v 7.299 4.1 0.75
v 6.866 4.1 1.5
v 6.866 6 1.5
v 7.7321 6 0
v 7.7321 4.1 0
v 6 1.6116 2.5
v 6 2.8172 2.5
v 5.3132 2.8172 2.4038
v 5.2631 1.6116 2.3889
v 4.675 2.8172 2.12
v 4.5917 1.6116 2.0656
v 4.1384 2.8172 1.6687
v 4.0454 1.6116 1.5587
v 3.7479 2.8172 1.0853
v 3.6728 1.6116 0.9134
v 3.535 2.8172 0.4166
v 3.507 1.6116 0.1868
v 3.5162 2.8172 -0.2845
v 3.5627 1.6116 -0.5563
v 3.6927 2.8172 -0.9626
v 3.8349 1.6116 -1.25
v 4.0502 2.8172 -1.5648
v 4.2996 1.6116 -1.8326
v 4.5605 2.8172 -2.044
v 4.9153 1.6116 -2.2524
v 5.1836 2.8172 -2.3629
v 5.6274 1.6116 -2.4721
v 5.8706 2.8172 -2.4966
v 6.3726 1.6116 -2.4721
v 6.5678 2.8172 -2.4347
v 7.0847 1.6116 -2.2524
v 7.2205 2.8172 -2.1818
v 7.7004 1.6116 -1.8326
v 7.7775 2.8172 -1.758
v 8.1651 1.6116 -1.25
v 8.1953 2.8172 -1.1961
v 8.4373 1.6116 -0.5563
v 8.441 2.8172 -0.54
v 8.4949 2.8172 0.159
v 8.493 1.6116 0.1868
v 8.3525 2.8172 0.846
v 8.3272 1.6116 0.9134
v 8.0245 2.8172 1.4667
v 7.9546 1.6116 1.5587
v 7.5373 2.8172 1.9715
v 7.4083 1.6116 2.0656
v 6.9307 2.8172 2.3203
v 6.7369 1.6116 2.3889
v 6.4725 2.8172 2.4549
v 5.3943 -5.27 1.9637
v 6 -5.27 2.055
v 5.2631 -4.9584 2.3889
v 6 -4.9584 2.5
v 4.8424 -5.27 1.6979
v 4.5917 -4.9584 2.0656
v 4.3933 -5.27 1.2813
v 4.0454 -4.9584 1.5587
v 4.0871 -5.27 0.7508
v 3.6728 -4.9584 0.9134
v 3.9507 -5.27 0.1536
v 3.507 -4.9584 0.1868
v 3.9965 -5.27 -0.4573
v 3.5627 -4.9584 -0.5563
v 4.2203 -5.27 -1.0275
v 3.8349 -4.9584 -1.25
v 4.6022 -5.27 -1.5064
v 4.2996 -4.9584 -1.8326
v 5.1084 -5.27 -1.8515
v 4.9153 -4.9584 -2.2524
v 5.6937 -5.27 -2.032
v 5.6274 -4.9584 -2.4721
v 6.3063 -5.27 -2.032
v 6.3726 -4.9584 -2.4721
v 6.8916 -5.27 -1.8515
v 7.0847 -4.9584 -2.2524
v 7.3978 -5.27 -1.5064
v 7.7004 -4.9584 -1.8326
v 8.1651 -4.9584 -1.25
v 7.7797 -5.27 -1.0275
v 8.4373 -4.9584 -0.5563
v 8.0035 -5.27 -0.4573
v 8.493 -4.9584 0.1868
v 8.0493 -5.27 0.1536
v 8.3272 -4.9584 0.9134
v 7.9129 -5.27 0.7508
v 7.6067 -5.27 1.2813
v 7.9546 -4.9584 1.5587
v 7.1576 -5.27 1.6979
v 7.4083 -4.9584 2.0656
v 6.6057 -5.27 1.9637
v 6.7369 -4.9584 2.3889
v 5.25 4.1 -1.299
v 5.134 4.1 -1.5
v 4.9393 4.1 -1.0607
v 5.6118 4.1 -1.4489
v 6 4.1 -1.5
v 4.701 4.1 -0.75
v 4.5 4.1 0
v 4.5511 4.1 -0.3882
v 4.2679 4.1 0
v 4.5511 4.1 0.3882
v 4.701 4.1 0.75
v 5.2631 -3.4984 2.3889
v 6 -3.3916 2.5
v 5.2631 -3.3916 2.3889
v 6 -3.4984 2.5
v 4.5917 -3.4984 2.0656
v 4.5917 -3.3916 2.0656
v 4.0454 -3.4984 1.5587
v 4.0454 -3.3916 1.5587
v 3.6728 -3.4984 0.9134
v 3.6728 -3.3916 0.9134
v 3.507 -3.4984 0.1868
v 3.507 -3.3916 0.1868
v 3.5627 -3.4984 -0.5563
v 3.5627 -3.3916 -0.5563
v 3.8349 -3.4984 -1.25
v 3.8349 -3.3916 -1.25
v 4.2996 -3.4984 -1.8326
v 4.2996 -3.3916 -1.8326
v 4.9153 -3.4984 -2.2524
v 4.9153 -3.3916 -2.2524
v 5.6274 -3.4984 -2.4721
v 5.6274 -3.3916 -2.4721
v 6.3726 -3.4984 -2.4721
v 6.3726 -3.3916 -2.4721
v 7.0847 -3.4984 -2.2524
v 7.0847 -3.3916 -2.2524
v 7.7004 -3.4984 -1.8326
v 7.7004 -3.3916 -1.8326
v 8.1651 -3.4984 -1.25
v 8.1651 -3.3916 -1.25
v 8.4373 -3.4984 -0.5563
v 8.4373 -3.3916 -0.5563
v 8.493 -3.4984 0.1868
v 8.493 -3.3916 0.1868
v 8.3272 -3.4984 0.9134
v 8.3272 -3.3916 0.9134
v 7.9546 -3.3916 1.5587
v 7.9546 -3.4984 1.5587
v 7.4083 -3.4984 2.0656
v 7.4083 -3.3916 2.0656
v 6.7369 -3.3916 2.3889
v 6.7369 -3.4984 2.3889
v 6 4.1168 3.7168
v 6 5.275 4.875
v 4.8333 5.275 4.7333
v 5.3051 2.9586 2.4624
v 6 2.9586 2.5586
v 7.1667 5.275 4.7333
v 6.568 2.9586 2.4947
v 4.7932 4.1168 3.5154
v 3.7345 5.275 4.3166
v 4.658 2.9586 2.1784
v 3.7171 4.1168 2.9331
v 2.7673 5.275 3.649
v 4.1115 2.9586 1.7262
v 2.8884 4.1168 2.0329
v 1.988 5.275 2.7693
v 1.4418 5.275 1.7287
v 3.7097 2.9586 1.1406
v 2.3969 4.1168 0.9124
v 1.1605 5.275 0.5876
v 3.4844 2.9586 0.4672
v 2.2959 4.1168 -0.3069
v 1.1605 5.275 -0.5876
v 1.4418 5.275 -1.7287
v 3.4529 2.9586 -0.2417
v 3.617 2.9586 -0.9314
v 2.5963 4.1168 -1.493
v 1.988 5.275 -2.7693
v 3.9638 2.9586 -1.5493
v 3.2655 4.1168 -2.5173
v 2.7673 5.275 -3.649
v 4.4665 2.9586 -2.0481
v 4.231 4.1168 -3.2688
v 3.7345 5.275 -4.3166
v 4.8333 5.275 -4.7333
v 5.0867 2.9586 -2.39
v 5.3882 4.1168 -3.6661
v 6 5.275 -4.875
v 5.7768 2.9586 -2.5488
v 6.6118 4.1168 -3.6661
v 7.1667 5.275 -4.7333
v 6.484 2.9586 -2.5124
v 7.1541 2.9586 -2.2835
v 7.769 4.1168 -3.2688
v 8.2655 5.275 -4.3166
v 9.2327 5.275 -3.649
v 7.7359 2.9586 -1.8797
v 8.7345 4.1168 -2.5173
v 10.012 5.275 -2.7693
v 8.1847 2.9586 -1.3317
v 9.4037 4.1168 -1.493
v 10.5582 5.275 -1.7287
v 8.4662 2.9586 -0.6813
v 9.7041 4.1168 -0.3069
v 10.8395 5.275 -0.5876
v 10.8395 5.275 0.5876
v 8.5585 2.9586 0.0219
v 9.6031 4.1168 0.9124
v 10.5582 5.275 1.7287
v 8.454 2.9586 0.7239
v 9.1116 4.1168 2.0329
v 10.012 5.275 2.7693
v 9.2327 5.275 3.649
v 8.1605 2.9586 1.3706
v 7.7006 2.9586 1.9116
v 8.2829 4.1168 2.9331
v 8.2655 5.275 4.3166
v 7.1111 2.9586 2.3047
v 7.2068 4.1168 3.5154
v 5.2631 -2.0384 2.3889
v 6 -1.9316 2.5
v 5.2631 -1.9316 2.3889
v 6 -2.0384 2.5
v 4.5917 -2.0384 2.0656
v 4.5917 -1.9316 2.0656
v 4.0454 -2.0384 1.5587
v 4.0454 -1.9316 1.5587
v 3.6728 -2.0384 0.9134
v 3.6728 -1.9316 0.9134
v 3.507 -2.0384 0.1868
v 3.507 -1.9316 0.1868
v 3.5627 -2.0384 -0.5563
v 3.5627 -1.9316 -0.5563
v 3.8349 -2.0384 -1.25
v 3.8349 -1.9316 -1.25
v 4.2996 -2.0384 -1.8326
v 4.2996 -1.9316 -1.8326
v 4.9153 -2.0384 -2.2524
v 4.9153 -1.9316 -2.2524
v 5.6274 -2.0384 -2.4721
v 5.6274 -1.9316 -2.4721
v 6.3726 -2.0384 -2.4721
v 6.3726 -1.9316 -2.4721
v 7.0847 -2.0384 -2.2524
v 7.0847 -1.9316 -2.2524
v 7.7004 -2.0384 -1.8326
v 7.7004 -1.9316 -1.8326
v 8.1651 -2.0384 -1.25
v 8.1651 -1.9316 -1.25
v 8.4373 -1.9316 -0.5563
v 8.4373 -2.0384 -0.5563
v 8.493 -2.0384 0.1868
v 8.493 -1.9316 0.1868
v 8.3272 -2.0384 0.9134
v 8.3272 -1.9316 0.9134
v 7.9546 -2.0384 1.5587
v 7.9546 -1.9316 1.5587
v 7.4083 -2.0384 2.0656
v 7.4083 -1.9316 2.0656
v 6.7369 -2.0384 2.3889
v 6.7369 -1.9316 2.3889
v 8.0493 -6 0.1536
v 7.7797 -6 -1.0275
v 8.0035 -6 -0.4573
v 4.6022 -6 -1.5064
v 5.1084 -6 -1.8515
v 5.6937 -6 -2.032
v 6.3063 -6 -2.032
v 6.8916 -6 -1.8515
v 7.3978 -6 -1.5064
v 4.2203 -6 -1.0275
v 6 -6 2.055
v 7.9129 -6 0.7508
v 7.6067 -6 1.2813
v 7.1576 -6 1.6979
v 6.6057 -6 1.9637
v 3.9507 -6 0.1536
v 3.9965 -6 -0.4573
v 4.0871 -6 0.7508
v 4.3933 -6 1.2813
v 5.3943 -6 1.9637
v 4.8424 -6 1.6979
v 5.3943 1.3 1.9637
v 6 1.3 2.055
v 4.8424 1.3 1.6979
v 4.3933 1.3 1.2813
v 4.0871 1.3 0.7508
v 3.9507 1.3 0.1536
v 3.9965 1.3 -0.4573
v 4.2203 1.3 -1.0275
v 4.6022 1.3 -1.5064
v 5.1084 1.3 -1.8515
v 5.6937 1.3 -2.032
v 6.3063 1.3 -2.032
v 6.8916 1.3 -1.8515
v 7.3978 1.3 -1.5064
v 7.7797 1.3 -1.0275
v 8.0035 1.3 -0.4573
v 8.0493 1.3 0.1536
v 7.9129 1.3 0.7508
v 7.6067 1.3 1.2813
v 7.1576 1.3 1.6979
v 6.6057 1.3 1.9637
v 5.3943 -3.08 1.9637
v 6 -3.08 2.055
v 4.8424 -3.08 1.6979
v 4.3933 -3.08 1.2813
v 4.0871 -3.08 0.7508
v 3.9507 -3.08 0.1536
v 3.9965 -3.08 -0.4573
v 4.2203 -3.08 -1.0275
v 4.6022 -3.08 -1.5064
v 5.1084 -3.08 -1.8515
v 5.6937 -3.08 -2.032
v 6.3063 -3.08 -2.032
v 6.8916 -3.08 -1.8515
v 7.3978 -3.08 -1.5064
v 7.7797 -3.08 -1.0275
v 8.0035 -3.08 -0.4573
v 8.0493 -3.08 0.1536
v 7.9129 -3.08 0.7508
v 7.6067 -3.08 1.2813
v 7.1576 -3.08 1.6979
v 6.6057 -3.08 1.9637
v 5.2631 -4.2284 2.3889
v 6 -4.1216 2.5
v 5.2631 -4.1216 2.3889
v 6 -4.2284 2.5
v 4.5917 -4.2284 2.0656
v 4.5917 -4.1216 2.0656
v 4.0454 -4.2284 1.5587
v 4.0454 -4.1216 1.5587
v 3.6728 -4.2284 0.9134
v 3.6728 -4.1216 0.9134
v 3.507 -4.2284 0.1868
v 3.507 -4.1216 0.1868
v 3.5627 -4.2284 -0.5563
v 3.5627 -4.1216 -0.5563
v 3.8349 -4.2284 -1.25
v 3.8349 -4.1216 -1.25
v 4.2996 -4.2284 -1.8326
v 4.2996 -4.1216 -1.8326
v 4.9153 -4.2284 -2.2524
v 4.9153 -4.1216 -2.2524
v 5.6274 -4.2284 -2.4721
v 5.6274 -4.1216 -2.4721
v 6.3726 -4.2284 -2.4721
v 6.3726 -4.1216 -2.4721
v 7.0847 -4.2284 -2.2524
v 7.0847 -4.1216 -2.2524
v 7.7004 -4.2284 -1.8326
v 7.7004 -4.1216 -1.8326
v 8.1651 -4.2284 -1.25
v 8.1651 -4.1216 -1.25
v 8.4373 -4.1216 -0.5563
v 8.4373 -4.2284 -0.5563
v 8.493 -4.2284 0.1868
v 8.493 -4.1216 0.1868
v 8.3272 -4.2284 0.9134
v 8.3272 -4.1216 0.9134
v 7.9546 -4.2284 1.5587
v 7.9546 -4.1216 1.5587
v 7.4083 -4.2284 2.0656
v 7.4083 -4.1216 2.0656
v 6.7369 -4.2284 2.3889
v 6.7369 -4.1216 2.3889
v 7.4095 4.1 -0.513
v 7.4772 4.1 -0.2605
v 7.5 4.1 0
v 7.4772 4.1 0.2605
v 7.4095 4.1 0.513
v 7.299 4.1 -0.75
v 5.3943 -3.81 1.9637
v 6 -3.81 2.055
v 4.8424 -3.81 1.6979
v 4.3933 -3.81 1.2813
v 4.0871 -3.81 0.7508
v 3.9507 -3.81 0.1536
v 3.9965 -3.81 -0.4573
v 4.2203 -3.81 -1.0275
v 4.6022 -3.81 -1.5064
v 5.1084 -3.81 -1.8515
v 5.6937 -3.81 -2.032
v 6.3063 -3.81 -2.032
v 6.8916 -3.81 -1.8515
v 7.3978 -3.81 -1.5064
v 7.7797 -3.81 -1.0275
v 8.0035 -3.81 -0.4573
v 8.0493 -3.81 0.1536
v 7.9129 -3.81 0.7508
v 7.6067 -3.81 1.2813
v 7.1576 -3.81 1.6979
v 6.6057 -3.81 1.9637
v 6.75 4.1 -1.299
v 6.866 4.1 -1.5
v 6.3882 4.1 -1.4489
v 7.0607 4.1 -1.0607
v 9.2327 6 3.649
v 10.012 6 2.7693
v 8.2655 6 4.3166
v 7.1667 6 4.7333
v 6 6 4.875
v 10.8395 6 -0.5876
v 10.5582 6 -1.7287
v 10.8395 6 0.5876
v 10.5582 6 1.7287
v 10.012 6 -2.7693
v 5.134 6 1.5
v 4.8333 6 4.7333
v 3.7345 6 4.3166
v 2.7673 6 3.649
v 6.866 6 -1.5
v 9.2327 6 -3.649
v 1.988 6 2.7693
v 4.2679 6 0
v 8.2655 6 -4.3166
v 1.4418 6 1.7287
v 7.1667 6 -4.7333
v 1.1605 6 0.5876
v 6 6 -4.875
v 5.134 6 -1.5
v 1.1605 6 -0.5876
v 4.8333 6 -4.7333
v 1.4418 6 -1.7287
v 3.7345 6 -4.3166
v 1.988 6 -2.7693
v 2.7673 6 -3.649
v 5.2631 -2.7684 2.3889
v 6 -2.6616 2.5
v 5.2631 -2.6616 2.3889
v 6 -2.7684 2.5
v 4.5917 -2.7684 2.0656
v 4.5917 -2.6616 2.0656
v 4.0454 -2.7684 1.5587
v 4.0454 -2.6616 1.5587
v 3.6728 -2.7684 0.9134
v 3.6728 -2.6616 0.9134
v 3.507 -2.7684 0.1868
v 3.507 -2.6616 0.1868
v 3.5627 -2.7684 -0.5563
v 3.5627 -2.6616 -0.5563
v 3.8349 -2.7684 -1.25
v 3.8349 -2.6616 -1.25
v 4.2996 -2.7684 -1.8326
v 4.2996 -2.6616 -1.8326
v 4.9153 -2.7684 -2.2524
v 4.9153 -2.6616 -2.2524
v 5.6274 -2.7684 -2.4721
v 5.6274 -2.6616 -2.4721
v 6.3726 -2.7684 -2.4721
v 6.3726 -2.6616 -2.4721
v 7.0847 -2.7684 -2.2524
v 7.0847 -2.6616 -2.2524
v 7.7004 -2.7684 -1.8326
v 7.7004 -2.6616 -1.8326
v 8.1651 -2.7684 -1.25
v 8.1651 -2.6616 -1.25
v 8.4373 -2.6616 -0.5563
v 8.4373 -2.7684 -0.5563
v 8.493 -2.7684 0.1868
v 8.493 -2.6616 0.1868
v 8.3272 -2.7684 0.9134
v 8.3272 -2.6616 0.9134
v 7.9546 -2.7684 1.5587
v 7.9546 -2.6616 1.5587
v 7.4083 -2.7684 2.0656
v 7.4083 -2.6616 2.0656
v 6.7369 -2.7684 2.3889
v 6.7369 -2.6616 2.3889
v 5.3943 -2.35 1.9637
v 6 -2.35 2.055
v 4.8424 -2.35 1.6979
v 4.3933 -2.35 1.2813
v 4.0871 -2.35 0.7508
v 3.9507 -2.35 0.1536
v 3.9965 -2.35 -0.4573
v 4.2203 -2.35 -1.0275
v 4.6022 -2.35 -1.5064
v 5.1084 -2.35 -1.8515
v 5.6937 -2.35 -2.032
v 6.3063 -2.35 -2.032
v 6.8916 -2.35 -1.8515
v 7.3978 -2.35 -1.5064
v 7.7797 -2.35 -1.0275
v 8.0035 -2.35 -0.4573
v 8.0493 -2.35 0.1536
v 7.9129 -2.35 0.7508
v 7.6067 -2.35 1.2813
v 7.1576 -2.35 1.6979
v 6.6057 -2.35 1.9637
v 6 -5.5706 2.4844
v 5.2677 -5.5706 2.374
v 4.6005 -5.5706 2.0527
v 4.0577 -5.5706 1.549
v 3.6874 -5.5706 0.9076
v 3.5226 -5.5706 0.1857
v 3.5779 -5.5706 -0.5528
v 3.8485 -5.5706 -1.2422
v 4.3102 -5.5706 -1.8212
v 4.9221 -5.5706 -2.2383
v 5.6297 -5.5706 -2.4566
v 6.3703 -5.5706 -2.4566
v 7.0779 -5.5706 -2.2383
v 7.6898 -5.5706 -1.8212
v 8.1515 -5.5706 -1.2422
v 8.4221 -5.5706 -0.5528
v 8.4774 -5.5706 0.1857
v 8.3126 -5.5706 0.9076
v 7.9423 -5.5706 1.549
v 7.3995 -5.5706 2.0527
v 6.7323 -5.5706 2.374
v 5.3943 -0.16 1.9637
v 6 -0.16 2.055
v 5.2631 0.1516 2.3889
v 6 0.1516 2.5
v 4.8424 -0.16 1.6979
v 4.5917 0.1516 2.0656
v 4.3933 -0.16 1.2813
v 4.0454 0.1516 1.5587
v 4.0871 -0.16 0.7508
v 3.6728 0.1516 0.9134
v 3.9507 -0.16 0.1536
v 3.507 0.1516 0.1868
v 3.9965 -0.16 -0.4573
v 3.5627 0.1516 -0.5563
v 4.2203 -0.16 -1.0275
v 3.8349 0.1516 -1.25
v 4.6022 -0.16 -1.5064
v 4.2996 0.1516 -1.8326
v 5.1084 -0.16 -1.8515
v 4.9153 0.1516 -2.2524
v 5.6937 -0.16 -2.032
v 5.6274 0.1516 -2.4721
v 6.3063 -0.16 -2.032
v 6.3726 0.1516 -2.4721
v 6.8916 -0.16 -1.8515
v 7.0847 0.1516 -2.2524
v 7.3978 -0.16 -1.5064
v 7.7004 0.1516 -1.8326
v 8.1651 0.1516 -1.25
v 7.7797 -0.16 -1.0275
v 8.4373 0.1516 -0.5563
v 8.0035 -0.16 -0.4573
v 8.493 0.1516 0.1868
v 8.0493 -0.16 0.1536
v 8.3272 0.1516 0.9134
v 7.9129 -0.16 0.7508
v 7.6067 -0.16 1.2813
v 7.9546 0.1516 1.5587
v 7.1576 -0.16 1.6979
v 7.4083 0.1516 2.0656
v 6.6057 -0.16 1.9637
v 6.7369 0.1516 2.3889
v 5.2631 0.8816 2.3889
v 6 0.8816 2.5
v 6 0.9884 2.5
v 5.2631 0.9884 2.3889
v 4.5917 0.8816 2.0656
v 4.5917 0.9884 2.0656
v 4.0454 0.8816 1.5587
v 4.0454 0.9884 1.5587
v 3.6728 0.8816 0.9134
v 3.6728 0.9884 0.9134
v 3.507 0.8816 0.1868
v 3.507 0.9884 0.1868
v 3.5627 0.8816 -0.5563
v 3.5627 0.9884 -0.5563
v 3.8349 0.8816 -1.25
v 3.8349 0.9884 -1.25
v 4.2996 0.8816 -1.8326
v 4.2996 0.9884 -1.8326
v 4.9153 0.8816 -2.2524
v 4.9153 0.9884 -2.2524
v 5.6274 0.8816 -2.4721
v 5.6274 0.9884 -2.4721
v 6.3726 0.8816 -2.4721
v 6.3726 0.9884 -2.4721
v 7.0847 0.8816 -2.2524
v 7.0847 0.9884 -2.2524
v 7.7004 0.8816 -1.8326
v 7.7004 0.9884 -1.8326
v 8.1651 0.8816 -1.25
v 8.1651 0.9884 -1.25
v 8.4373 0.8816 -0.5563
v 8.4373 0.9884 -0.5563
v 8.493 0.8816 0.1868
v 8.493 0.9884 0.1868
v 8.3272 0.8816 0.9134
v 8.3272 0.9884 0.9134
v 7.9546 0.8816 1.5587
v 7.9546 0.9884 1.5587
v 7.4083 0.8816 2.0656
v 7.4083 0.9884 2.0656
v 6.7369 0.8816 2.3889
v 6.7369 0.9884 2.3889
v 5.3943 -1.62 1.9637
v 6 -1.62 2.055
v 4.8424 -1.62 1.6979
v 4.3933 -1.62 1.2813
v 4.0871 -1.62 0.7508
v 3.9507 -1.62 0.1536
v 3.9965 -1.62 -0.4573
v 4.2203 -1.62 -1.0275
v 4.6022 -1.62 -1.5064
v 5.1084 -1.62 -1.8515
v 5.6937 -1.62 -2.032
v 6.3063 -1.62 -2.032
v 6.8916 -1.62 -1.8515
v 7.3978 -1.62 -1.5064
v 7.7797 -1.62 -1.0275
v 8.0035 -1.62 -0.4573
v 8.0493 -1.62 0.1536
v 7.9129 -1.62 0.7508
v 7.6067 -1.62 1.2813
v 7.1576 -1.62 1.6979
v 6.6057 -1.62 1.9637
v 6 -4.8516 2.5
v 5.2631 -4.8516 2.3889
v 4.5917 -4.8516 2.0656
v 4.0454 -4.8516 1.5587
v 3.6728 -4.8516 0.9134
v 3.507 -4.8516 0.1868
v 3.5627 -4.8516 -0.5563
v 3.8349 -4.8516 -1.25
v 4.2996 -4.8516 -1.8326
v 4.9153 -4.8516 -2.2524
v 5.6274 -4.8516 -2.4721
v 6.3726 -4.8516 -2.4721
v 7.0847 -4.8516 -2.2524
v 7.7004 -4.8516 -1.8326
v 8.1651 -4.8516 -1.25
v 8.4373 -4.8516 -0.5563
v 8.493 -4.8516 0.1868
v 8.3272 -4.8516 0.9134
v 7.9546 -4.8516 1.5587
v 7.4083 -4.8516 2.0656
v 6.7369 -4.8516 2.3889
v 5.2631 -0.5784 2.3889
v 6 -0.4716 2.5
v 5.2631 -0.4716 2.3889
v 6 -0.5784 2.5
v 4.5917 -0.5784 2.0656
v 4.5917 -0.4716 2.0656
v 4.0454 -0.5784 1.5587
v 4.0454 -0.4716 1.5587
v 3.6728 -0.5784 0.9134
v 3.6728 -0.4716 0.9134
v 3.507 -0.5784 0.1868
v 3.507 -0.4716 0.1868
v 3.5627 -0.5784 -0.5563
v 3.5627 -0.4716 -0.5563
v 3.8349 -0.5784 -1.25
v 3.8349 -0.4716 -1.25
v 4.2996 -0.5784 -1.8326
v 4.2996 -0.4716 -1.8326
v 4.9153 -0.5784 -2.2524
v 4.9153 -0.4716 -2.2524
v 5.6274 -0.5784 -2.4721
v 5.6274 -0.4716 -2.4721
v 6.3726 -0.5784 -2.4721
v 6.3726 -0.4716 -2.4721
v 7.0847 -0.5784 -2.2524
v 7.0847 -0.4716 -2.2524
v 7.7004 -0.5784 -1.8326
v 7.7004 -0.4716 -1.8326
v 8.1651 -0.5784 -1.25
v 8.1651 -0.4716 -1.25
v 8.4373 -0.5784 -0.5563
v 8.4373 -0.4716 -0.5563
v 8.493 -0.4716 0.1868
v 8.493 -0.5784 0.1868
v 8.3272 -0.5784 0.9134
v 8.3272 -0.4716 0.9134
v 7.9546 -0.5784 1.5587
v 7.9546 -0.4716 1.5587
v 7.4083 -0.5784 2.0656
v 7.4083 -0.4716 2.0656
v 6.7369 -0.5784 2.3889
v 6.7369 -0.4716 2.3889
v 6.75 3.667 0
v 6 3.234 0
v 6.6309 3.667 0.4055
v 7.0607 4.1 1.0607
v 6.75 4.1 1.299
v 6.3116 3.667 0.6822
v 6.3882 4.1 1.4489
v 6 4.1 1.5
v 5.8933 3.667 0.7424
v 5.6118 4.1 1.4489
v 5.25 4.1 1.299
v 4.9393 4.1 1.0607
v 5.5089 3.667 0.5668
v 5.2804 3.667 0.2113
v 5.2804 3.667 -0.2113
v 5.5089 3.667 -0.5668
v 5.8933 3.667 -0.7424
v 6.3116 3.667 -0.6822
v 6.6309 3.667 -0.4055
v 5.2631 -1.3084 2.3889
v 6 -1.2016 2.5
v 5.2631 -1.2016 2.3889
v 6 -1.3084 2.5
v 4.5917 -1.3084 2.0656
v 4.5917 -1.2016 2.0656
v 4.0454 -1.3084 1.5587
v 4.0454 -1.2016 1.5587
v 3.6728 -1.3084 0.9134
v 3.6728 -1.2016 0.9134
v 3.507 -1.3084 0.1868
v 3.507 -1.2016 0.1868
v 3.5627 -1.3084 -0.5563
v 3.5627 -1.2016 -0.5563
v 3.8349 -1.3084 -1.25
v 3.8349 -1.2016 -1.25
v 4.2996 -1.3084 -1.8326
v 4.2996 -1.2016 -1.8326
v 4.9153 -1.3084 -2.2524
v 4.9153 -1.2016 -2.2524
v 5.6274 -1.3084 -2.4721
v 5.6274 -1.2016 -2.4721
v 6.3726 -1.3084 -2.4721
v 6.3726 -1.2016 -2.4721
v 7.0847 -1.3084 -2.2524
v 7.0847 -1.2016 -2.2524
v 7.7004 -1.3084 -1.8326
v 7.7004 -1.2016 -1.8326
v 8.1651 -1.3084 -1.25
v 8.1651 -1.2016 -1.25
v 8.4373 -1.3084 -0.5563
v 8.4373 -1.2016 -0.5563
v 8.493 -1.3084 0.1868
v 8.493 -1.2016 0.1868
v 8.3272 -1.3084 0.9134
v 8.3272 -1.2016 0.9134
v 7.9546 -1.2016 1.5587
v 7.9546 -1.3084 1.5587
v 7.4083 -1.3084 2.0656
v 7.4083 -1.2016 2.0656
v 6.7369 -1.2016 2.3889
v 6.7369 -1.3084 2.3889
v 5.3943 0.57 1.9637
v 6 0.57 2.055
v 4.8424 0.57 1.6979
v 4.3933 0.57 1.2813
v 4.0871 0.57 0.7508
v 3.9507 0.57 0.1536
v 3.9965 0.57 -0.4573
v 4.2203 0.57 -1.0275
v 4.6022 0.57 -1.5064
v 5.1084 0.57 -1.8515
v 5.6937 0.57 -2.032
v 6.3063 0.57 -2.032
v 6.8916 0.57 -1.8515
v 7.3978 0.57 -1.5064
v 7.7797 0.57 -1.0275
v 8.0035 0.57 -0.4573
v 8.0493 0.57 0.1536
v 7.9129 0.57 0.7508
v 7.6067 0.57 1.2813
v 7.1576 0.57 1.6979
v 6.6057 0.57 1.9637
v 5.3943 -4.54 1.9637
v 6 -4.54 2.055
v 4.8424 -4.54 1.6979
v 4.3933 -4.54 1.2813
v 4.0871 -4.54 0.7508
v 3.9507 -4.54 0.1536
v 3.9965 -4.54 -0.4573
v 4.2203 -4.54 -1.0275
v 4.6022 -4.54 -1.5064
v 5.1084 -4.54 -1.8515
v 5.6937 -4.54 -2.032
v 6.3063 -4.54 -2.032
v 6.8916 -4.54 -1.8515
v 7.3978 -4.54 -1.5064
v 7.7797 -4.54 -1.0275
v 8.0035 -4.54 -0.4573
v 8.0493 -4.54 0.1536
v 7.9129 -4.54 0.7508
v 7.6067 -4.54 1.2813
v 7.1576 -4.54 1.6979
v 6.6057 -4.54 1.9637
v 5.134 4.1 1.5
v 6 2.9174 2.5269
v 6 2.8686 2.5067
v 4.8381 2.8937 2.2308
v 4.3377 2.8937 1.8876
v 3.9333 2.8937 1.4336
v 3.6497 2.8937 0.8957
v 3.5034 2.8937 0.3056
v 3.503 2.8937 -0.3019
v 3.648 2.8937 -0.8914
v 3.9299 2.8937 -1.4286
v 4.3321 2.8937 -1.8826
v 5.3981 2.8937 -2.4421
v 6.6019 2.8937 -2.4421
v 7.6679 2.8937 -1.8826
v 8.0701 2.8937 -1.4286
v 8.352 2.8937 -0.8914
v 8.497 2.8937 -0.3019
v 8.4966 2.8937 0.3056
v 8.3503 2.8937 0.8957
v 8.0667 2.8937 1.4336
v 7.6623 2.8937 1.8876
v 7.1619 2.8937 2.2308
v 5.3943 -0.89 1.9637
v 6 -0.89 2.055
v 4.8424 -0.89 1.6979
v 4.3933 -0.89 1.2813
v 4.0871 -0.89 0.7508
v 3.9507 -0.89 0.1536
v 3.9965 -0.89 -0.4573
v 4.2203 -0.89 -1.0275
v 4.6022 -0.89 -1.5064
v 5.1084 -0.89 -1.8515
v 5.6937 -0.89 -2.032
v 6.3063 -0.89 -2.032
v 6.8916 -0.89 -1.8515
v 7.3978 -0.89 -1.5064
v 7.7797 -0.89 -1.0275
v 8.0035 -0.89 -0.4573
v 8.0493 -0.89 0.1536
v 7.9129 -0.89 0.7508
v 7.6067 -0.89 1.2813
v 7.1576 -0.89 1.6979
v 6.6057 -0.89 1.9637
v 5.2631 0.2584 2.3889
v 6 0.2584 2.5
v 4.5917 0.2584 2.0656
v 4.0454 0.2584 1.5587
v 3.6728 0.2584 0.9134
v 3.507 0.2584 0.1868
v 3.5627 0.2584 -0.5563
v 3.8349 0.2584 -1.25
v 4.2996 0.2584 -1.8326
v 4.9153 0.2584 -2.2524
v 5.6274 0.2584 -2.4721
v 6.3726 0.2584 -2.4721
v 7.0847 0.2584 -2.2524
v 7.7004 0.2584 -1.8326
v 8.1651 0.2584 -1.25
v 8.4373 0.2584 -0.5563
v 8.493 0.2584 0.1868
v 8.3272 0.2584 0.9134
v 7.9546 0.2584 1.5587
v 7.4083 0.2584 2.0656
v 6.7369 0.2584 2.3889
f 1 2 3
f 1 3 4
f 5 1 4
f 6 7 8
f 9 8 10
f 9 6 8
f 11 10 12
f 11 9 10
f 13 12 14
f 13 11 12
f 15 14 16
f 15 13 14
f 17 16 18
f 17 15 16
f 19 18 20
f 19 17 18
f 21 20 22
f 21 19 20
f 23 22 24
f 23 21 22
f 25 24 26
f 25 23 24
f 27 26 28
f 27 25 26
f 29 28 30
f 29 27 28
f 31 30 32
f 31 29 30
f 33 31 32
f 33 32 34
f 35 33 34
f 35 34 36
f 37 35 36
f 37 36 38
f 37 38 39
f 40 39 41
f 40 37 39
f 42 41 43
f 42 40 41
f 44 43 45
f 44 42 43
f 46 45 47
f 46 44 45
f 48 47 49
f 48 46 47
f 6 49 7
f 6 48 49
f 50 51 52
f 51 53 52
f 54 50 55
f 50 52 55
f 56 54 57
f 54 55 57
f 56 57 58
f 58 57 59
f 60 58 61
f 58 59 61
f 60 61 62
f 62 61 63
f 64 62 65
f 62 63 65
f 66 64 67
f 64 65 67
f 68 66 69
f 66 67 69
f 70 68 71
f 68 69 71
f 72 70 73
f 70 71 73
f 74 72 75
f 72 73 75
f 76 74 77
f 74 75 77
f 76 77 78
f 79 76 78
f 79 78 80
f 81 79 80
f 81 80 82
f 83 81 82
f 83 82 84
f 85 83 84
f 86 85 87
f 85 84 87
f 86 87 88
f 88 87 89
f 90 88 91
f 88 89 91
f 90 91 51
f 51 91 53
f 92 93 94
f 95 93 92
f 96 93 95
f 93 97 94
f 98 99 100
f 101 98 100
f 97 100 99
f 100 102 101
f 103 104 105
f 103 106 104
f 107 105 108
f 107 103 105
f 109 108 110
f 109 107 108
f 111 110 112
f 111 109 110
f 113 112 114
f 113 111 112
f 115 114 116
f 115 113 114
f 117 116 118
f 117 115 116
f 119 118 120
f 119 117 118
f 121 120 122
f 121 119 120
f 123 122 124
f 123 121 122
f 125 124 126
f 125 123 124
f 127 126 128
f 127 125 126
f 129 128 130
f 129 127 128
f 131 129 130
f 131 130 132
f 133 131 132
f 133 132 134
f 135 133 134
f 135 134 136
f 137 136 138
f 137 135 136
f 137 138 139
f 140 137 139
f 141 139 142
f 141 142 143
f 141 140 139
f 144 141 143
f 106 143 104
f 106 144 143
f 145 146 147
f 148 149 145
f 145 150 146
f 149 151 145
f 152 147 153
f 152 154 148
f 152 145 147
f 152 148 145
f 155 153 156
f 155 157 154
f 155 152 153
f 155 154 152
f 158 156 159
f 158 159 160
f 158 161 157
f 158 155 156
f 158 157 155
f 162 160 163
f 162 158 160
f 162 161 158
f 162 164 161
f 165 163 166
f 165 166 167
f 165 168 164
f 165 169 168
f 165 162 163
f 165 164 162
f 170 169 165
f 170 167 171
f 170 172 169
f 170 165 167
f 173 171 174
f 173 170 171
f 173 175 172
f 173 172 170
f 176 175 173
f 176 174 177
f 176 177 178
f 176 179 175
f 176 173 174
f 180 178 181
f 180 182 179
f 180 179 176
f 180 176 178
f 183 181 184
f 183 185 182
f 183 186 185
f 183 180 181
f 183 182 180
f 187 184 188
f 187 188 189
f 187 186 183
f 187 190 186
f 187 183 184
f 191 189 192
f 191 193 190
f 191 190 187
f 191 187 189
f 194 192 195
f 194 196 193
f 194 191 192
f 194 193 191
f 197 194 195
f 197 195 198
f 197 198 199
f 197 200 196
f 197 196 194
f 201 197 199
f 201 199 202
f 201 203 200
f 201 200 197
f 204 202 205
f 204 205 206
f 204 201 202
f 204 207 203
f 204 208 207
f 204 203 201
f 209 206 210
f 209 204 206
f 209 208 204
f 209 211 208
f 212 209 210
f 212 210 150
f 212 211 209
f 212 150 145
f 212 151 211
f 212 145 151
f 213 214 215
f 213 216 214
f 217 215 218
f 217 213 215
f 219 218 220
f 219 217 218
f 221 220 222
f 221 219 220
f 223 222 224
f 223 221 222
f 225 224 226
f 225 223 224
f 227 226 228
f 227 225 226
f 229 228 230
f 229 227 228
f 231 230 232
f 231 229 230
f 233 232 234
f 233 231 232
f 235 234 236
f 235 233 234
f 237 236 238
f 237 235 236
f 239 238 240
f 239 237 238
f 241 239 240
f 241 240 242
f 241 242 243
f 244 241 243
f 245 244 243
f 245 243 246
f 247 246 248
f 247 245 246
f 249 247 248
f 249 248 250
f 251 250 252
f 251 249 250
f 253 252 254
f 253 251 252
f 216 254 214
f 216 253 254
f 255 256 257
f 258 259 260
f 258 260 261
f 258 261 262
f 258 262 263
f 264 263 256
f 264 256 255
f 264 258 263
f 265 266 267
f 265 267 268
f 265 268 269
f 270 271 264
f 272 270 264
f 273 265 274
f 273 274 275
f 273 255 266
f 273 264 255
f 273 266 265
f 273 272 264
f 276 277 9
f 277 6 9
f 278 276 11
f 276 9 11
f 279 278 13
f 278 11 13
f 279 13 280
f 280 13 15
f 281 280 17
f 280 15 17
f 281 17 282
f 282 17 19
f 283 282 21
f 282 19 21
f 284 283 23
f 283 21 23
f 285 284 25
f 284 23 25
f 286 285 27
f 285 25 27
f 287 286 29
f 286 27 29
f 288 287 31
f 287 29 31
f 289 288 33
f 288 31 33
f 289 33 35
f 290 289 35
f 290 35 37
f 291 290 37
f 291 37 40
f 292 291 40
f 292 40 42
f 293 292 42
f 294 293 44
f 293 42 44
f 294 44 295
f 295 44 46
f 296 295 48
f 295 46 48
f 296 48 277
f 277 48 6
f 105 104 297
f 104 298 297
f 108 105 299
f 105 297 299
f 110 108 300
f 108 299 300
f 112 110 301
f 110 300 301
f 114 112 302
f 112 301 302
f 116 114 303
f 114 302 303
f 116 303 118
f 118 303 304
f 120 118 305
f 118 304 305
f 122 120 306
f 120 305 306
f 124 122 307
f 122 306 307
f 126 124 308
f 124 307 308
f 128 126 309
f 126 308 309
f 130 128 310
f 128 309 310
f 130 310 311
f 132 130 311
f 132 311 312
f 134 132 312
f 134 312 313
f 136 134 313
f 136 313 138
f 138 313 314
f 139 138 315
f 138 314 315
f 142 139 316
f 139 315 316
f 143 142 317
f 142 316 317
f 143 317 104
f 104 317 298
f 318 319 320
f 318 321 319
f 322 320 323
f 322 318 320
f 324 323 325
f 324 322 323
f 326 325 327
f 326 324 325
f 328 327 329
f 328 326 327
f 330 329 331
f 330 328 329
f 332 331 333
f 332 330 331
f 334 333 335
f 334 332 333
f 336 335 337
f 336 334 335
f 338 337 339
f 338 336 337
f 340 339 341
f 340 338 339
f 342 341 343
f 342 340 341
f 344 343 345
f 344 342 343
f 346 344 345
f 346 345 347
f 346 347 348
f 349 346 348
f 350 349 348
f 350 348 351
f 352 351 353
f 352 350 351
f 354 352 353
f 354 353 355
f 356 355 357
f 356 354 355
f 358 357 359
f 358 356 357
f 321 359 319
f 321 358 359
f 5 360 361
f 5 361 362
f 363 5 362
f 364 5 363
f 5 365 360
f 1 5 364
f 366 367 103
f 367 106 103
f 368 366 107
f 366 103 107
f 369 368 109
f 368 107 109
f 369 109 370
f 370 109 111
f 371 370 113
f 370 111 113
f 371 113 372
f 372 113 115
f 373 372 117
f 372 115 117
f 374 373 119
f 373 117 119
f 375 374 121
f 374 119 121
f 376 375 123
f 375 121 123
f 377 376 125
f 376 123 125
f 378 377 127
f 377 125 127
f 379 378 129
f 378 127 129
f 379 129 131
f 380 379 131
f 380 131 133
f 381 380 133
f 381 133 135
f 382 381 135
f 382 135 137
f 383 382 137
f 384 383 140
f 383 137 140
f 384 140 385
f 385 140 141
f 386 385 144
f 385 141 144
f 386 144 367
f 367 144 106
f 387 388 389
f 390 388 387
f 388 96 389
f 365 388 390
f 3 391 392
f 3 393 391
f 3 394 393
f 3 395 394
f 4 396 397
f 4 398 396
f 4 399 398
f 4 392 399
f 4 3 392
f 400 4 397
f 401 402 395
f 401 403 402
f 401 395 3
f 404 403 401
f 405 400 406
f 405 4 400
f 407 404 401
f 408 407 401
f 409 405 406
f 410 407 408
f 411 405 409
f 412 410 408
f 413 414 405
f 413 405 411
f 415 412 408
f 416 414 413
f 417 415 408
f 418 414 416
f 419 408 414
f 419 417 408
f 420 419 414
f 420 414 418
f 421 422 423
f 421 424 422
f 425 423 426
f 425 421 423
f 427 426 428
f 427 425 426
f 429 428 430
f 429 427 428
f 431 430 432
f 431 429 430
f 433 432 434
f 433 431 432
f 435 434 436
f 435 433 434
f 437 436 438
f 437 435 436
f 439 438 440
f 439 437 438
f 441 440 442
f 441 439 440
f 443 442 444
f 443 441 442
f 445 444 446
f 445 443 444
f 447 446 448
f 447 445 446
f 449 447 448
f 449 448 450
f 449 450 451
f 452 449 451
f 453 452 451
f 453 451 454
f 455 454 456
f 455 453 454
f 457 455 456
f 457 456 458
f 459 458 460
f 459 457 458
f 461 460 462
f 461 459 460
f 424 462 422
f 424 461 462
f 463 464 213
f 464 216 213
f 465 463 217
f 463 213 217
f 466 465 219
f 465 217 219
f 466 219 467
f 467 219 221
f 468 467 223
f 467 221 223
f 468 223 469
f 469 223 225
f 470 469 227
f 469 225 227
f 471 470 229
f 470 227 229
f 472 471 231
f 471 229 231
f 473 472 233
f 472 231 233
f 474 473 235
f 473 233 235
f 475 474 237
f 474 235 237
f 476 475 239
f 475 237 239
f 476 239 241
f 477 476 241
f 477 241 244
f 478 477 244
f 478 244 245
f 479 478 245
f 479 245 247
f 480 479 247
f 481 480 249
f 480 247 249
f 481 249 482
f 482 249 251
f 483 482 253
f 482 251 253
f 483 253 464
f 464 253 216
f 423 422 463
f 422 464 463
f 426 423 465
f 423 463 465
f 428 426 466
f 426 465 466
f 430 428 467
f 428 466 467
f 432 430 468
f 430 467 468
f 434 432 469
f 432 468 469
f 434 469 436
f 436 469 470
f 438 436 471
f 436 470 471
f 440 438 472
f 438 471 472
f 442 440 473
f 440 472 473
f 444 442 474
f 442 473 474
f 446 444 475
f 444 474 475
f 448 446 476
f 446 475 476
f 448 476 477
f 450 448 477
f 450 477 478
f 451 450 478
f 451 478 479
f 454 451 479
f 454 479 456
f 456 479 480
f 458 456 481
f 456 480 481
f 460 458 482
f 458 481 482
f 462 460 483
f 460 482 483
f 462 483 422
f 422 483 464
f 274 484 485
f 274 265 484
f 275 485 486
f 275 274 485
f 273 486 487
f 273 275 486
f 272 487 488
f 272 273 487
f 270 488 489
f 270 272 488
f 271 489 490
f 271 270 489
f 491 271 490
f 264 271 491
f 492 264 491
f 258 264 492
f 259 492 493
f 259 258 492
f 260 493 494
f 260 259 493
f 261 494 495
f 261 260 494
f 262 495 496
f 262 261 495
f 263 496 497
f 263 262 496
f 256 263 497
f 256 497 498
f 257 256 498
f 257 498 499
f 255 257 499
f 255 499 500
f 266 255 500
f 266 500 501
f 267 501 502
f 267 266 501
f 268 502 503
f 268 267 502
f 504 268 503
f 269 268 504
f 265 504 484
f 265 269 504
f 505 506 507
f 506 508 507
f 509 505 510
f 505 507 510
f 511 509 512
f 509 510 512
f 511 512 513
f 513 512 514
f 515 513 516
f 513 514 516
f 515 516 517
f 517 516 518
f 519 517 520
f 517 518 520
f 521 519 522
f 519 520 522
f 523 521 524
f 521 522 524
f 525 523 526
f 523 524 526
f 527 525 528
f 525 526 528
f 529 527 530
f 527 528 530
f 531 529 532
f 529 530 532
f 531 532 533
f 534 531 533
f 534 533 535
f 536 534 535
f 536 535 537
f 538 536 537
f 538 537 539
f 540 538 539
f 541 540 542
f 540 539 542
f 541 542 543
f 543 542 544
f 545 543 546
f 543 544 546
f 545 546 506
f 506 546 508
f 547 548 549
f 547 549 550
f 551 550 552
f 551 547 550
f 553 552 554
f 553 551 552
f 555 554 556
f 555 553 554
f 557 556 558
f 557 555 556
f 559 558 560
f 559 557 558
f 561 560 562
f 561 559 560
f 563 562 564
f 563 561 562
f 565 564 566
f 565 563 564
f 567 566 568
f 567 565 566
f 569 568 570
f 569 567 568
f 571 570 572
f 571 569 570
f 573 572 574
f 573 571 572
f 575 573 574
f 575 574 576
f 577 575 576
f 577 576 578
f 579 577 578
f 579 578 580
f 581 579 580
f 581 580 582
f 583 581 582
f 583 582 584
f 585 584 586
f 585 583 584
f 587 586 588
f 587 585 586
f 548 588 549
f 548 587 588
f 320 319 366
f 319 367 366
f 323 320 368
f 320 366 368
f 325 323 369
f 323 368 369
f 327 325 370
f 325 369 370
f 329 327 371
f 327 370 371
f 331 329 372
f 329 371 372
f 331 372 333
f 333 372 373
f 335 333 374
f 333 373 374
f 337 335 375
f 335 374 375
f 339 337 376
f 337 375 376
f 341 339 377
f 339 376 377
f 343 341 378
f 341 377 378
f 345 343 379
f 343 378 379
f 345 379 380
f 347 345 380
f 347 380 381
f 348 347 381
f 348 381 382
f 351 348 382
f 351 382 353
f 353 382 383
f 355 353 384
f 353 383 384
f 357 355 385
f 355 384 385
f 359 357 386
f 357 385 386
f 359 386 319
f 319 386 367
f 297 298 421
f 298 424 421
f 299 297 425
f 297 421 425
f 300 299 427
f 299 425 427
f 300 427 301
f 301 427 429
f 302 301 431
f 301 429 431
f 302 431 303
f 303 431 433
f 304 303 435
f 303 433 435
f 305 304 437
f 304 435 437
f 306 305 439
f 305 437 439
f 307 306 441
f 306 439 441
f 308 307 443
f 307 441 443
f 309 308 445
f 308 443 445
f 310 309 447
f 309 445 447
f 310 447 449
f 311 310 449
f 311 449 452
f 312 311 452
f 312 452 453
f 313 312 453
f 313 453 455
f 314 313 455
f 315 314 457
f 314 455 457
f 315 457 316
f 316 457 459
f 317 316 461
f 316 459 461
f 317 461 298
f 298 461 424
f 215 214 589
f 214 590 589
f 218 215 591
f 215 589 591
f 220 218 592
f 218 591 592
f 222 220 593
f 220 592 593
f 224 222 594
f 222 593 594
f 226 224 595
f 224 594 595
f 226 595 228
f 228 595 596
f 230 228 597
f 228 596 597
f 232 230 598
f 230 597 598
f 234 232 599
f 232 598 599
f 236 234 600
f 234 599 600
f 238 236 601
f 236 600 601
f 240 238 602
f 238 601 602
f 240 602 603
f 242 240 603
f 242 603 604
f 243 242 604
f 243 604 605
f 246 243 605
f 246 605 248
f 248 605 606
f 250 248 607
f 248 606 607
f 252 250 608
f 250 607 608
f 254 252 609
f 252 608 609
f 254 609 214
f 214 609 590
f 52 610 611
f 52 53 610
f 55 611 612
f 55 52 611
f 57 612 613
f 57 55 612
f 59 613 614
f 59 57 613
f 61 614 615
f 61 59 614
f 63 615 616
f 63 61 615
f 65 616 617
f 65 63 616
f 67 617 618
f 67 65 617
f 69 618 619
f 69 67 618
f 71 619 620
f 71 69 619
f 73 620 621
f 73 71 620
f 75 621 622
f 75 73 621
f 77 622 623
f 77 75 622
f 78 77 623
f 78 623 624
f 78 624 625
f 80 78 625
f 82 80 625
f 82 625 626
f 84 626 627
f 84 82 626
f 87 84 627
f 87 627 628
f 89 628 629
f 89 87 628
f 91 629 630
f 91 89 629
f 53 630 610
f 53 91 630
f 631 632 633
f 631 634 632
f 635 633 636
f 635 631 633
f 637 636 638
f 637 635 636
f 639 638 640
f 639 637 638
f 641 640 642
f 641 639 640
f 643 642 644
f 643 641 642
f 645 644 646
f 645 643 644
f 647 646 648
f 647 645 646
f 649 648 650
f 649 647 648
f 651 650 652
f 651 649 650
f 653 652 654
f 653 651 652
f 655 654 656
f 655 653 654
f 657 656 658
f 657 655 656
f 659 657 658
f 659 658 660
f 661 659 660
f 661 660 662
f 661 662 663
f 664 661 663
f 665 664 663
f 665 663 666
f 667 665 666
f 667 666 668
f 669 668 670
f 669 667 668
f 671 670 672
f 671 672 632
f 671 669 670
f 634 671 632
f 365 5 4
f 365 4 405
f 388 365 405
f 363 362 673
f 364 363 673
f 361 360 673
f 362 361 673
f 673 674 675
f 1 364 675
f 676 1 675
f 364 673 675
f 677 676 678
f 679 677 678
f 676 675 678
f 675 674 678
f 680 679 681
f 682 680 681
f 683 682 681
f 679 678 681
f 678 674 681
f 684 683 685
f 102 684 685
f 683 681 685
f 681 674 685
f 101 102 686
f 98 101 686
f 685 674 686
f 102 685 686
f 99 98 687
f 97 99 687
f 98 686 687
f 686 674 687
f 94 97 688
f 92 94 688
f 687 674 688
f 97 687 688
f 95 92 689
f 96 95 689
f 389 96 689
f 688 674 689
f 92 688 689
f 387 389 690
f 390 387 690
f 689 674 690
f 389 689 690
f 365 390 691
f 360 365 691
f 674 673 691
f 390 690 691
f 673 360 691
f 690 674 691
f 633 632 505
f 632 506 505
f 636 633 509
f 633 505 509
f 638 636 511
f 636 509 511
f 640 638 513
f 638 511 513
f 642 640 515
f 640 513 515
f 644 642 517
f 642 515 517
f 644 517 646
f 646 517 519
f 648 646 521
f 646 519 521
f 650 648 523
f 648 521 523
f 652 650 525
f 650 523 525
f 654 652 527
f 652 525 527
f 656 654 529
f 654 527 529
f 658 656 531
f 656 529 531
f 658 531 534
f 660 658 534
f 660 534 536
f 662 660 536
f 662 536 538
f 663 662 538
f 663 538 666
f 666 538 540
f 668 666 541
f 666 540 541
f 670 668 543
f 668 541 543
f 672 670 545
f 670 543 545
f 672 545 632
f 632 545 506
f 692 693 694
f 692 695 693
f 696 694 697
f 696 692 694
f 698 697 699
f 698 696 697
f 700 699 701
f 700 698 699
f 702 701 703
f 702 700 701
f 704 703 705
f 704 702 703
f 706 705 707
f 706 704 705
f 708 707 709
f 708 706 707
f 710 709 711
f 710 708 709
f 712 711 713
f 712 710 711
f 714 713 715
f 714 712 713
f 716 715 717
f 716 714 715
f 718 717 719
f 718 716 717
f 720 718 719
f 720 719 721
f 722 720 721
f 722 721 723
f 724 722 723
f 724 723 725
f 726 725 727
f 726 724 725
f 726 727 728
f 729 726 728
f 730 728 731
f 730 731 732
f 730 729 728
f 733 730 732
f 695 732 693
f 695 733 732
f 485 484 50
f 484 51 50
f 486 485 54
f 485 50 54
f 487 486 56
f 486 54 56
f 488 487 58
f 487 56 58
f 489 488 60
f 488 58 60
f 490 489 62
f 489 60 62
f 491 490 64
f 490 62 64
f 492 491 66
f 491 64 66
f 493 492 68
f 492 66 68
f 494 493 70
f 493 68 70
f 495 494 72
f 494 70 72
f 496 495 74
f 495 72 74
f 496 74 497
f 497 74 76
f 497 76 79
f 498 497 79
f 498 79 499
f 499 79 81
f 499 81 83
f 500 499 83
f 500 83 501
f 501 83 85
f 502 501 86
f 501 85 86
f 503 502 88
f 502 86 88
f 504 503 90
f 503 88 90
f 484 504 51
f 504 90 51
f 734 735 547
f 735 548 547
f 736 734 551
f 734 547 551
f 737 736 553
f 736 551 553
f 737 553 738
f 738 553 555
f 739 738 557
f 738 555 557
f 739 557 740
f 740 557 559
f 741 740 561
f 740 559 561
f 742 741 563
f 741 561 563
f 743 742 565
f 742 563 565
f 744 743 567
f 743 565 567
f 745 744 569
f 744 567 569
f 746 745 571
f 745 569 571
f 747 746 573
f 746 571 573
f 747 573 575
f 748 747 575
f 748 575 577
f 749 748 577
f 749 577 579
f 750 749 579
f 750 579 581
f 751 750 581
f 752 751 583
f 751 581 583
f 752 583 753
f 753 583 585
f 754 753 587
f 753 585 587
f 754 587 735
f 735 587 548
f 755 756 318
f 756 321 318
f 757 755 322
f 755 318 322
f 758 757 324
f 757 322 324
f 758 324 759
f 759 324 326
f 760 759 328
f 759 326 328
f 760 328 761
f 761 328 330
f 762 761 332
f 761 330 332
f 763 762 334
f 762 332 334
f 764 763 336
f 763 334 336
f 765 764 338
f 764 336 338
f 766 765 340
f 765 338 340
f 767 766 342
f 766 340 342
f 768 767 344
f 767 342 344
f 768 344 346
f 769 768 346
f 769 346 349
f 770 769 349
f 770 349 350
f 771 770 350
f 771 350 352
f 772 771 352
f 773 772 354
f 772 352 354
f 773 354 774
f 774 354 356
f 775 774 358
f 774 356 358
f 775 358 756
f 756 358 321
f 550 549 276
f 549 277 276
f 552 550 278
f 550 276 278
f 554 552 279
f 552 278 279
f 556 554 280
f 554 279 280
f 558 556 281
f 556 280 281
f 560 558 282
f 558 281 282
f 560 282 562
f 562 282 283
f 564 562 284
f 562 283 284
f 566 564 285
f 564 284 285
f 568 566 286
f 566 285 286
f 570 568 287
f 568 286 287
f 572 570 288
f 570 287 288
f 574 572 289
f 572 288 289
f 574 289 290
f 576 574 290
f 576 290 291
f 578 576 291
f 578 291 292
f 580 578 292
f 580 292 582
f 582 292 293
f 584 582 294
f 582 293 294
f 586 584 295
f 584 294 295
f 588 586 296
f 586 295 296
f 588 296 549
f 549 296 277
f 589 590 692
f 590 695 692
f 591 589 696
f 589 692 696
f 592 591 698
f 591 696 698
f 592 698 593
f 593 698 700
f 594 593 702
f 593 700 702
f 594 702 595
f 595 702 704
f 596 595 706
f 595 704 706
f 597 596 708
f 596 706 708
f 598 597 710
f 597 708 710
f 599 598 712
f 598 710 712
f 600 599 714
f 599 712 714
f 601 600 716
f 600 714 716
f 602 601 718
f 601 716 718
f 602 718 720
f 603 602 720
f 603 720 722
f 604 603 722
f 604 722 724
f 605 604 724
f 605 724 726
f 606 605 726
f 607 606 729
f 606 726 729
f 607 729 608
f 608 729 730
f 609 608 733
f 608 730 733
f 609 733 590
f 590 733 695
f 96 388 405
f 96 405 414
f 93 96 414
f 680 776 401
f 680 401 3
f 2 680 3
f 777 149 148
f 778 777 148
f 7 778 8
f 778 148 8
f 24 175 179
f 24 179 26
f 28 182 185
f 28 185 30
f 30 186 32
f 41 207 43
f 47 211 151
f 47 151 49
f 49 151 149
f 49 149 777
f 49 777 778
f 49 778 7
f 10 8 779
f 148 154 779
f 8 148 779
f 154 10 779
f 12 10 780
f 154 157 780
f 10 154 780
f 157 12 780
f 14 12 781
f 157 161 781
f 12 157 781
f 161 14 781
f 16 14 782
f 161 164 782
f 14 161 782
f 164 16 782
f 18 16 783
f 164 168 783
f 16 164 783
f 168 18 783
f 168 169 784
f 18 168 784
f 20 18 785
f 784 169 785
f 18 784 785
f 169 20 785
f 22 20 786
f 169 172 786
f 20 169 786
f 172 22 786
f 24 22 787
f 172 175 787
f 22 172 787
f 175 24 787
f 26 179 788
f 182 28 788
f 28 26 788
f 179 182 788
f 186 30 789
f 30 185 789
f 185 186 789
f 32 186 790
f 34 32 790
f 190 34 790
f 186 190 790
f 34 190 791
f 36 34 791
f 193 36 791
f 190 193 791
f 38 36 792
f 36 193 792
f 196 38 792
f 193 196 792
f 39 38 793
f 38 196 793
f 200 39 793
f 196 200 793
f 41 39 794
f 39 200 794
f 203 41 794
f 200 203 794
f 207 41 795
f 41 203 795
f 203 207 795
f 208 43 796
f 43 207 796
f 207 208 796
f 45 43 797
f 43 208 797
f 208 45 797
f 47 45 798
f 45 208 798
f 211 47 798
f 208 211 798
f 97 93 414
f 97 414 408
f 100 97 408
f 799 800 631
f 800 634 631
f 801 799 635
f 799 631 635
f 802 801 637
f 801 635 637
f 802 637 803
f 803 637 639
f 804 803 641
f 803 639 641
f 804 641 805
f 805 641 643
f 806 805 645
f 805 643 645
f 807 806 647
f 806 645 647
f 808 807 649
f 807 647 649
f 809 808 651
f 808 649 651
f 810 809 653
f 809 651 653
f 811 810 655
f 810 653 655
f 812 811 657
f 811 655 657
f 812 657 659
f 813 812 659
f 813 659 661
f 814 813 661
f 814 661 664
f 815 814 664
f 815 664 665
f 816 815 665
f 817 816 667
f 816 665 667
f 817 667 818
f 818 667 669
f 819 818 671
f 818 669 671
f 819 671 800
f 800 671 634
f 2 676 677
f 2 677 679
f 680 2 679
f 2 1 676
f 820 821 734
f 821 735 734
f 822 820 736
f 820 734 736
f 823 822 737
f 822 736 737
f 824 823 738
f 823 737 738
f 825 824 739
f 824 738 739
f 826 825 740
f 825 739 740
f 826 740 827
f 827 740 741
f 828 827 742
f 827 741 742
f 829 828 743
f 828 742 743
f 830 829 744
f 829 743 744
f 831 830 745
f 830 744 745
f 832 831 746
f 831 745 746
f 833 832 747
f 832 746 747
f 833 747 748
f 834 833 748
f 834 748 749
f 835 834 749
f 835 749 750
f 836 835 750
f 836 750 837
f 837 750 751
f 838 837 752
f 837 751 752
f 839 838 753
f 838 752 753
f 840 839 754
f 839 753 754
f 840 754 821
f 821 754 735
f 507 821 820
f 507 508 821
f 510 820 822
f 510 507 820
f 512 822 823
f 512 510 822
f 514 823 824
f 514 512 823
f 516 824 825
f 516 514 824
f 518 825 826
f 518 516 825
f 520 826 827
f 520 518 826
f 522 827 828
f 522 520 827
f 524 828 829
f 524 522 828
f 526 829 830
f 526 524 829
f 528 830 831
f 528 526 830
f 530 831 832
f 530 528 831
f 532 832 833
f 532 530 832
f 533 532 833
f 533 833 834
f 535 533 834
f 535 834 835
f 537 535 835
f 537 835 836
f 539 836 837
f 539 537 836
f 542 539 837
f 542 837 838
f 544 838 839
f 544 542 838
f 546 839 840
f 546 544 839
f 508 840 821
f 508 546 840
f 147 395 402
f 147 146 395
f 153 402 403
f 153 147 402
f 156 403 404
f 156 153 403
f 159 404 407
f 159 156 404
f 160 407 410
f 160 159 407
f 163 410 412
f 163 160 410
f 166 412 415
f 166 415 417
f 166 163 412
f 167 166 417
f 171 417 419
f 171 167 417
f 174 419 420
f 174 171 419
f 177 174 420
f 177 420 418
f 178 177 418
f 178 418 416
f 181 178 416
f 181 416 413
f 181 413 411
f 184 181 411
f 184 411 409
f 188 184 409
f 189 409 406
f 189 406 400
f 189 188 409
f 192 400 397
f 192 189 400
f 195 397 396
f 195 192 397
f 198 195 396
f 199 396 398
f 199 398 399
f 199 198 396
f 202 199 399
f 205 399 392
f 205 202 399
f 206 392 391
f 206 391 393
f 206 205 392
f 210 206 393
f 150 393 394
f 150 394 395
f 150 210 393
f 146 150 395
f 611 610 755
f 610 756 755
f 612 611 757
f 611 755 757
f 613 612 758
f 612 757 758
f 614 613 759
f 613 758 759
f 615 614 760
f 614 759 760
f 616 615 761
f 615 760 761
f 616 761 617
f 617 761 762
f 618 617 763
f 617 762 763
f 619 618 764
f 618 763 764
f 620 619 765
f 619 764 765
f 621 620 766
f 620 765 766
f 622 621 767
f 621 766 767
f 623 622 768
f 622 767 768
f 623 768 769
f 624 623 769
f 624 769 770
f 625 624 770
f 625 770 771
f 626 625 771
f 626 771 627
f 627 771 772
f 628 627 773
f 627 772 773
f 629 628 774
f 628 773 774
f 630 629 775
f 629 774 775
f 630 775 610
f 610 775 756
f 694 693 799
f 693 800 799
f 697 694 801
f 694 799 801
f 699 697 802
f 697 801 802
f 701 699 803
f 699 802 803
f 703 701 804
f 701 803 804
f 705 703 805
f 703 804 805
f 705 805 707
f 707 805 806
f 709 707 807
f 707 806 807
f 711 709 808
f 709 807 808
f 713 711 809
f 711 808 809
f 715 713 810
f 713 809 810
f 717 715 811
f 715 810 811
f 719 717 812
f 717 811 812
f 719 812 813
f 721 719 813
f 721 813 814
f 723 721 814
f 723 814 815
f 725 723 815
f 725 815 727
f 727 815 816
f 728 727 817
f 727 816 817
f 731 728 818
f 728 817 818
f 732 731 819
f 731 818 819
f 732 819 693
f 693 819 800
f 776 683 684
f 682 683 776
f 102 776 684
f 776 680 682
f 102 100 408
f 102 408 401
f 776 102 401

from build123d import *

# Parameters (mm, degrees)
FILLET1_R             = 0.2
HEX_START             = -1.9
HEX_2_DEPTH           = 1.9
THDSCHPAT_COUNT       = 10
THDSCHPAT_PITCH       = 0.73
BODY_MOVE_COPY1_ANGLE = 90


with BuildPart() as part:
    # BodySke → BaseBody (revolve)
    with BuildSketch(Plane.XY, mode=Mode.PRIVATE) as basebody_sk:
        Polygon((0, 0), (0, 4.875), (0.725, 4.875), (3.1, 2.5), (11.555, 2.5), (12, 2.055), (12, 0), align=None)
    revolve(basebody_sk.sketch.rotate(Axis((0, 0, 0), (1, 0, 0)), 90), axis=Axis((0, 0, 0), (1, 0, 0)))

    # Fillet1
    fillet1_edges = [part.edges().sort_by_distance(p)[0] for p in [
        (3.1, 0, -2.5),
    ]]
    fillet(fillet1_edges, radius=FILLET1_R)

    # Hex 2: read off the stored shape, not the designer's step
    # Hex 2 outline → Hex 2 (cut)
    with BuildSketch(Plane.ZY.offset(HEX_START)):
        Polygon((-1.5, -0.866025404), (0, -1.732050808), (1.5, -0.866025404), (1.5, 0.866025404), (0, 1.732050808), (-1.5, 0.866025404), align=None)
    extrude(amount=HEX_2_DEPTH, mode=Mode.SUBTRACT)

    # Hex 2 2 outline → Hex 2 2 (revolve, cut)
    with BuildSketch(Plane.YX):
        Polygon((1.5, 1.9), (0, 2.766025404), (0, 1.9), align=None)
    revolve(axis=Axis((0, 0, 0), (1, 0, 0)), mode=Mode.SUBTRACT)

    # ThdSchSke → ThreadSchematic (revolve, cut)
    with BuildSketch(Plane.XY, mode=Mode.PRIVATE) as threadschematic_sk:
        Polygon((4.700001, -2.055), (4.388408645, -2.5), (4.388408645, -3.125), (5.011593355, -3.125), (5.011593355, -2.5), align=None)
    threadschematic = revolve(threadschematic_sk.sketch.rotate(Axis((-3.175, 0, 0), (1, 0, 0)), 270), axis=Axis((-3.175, 0, 0), (1, 0, 0)), mode=Mode.SUBTRACT)

    # ThdSchPat: ThreadSchematic ×10
    with Locations(*[(i * THDSCHPAT_PITCH, 0, 0) for i in range(1, THDSCHPAT_COUNT)]):
        add(threadschematic, mode=Mode.SUBTRACT)


with BuildPart() as part_1:
    # Body-Move/Copy1: moved
    add(part.part.rotate(Axis((6, 0, 0), (0, 0, -1)), BODY_MOVE_COPY1_ANGLE))


solid = part_1.part
